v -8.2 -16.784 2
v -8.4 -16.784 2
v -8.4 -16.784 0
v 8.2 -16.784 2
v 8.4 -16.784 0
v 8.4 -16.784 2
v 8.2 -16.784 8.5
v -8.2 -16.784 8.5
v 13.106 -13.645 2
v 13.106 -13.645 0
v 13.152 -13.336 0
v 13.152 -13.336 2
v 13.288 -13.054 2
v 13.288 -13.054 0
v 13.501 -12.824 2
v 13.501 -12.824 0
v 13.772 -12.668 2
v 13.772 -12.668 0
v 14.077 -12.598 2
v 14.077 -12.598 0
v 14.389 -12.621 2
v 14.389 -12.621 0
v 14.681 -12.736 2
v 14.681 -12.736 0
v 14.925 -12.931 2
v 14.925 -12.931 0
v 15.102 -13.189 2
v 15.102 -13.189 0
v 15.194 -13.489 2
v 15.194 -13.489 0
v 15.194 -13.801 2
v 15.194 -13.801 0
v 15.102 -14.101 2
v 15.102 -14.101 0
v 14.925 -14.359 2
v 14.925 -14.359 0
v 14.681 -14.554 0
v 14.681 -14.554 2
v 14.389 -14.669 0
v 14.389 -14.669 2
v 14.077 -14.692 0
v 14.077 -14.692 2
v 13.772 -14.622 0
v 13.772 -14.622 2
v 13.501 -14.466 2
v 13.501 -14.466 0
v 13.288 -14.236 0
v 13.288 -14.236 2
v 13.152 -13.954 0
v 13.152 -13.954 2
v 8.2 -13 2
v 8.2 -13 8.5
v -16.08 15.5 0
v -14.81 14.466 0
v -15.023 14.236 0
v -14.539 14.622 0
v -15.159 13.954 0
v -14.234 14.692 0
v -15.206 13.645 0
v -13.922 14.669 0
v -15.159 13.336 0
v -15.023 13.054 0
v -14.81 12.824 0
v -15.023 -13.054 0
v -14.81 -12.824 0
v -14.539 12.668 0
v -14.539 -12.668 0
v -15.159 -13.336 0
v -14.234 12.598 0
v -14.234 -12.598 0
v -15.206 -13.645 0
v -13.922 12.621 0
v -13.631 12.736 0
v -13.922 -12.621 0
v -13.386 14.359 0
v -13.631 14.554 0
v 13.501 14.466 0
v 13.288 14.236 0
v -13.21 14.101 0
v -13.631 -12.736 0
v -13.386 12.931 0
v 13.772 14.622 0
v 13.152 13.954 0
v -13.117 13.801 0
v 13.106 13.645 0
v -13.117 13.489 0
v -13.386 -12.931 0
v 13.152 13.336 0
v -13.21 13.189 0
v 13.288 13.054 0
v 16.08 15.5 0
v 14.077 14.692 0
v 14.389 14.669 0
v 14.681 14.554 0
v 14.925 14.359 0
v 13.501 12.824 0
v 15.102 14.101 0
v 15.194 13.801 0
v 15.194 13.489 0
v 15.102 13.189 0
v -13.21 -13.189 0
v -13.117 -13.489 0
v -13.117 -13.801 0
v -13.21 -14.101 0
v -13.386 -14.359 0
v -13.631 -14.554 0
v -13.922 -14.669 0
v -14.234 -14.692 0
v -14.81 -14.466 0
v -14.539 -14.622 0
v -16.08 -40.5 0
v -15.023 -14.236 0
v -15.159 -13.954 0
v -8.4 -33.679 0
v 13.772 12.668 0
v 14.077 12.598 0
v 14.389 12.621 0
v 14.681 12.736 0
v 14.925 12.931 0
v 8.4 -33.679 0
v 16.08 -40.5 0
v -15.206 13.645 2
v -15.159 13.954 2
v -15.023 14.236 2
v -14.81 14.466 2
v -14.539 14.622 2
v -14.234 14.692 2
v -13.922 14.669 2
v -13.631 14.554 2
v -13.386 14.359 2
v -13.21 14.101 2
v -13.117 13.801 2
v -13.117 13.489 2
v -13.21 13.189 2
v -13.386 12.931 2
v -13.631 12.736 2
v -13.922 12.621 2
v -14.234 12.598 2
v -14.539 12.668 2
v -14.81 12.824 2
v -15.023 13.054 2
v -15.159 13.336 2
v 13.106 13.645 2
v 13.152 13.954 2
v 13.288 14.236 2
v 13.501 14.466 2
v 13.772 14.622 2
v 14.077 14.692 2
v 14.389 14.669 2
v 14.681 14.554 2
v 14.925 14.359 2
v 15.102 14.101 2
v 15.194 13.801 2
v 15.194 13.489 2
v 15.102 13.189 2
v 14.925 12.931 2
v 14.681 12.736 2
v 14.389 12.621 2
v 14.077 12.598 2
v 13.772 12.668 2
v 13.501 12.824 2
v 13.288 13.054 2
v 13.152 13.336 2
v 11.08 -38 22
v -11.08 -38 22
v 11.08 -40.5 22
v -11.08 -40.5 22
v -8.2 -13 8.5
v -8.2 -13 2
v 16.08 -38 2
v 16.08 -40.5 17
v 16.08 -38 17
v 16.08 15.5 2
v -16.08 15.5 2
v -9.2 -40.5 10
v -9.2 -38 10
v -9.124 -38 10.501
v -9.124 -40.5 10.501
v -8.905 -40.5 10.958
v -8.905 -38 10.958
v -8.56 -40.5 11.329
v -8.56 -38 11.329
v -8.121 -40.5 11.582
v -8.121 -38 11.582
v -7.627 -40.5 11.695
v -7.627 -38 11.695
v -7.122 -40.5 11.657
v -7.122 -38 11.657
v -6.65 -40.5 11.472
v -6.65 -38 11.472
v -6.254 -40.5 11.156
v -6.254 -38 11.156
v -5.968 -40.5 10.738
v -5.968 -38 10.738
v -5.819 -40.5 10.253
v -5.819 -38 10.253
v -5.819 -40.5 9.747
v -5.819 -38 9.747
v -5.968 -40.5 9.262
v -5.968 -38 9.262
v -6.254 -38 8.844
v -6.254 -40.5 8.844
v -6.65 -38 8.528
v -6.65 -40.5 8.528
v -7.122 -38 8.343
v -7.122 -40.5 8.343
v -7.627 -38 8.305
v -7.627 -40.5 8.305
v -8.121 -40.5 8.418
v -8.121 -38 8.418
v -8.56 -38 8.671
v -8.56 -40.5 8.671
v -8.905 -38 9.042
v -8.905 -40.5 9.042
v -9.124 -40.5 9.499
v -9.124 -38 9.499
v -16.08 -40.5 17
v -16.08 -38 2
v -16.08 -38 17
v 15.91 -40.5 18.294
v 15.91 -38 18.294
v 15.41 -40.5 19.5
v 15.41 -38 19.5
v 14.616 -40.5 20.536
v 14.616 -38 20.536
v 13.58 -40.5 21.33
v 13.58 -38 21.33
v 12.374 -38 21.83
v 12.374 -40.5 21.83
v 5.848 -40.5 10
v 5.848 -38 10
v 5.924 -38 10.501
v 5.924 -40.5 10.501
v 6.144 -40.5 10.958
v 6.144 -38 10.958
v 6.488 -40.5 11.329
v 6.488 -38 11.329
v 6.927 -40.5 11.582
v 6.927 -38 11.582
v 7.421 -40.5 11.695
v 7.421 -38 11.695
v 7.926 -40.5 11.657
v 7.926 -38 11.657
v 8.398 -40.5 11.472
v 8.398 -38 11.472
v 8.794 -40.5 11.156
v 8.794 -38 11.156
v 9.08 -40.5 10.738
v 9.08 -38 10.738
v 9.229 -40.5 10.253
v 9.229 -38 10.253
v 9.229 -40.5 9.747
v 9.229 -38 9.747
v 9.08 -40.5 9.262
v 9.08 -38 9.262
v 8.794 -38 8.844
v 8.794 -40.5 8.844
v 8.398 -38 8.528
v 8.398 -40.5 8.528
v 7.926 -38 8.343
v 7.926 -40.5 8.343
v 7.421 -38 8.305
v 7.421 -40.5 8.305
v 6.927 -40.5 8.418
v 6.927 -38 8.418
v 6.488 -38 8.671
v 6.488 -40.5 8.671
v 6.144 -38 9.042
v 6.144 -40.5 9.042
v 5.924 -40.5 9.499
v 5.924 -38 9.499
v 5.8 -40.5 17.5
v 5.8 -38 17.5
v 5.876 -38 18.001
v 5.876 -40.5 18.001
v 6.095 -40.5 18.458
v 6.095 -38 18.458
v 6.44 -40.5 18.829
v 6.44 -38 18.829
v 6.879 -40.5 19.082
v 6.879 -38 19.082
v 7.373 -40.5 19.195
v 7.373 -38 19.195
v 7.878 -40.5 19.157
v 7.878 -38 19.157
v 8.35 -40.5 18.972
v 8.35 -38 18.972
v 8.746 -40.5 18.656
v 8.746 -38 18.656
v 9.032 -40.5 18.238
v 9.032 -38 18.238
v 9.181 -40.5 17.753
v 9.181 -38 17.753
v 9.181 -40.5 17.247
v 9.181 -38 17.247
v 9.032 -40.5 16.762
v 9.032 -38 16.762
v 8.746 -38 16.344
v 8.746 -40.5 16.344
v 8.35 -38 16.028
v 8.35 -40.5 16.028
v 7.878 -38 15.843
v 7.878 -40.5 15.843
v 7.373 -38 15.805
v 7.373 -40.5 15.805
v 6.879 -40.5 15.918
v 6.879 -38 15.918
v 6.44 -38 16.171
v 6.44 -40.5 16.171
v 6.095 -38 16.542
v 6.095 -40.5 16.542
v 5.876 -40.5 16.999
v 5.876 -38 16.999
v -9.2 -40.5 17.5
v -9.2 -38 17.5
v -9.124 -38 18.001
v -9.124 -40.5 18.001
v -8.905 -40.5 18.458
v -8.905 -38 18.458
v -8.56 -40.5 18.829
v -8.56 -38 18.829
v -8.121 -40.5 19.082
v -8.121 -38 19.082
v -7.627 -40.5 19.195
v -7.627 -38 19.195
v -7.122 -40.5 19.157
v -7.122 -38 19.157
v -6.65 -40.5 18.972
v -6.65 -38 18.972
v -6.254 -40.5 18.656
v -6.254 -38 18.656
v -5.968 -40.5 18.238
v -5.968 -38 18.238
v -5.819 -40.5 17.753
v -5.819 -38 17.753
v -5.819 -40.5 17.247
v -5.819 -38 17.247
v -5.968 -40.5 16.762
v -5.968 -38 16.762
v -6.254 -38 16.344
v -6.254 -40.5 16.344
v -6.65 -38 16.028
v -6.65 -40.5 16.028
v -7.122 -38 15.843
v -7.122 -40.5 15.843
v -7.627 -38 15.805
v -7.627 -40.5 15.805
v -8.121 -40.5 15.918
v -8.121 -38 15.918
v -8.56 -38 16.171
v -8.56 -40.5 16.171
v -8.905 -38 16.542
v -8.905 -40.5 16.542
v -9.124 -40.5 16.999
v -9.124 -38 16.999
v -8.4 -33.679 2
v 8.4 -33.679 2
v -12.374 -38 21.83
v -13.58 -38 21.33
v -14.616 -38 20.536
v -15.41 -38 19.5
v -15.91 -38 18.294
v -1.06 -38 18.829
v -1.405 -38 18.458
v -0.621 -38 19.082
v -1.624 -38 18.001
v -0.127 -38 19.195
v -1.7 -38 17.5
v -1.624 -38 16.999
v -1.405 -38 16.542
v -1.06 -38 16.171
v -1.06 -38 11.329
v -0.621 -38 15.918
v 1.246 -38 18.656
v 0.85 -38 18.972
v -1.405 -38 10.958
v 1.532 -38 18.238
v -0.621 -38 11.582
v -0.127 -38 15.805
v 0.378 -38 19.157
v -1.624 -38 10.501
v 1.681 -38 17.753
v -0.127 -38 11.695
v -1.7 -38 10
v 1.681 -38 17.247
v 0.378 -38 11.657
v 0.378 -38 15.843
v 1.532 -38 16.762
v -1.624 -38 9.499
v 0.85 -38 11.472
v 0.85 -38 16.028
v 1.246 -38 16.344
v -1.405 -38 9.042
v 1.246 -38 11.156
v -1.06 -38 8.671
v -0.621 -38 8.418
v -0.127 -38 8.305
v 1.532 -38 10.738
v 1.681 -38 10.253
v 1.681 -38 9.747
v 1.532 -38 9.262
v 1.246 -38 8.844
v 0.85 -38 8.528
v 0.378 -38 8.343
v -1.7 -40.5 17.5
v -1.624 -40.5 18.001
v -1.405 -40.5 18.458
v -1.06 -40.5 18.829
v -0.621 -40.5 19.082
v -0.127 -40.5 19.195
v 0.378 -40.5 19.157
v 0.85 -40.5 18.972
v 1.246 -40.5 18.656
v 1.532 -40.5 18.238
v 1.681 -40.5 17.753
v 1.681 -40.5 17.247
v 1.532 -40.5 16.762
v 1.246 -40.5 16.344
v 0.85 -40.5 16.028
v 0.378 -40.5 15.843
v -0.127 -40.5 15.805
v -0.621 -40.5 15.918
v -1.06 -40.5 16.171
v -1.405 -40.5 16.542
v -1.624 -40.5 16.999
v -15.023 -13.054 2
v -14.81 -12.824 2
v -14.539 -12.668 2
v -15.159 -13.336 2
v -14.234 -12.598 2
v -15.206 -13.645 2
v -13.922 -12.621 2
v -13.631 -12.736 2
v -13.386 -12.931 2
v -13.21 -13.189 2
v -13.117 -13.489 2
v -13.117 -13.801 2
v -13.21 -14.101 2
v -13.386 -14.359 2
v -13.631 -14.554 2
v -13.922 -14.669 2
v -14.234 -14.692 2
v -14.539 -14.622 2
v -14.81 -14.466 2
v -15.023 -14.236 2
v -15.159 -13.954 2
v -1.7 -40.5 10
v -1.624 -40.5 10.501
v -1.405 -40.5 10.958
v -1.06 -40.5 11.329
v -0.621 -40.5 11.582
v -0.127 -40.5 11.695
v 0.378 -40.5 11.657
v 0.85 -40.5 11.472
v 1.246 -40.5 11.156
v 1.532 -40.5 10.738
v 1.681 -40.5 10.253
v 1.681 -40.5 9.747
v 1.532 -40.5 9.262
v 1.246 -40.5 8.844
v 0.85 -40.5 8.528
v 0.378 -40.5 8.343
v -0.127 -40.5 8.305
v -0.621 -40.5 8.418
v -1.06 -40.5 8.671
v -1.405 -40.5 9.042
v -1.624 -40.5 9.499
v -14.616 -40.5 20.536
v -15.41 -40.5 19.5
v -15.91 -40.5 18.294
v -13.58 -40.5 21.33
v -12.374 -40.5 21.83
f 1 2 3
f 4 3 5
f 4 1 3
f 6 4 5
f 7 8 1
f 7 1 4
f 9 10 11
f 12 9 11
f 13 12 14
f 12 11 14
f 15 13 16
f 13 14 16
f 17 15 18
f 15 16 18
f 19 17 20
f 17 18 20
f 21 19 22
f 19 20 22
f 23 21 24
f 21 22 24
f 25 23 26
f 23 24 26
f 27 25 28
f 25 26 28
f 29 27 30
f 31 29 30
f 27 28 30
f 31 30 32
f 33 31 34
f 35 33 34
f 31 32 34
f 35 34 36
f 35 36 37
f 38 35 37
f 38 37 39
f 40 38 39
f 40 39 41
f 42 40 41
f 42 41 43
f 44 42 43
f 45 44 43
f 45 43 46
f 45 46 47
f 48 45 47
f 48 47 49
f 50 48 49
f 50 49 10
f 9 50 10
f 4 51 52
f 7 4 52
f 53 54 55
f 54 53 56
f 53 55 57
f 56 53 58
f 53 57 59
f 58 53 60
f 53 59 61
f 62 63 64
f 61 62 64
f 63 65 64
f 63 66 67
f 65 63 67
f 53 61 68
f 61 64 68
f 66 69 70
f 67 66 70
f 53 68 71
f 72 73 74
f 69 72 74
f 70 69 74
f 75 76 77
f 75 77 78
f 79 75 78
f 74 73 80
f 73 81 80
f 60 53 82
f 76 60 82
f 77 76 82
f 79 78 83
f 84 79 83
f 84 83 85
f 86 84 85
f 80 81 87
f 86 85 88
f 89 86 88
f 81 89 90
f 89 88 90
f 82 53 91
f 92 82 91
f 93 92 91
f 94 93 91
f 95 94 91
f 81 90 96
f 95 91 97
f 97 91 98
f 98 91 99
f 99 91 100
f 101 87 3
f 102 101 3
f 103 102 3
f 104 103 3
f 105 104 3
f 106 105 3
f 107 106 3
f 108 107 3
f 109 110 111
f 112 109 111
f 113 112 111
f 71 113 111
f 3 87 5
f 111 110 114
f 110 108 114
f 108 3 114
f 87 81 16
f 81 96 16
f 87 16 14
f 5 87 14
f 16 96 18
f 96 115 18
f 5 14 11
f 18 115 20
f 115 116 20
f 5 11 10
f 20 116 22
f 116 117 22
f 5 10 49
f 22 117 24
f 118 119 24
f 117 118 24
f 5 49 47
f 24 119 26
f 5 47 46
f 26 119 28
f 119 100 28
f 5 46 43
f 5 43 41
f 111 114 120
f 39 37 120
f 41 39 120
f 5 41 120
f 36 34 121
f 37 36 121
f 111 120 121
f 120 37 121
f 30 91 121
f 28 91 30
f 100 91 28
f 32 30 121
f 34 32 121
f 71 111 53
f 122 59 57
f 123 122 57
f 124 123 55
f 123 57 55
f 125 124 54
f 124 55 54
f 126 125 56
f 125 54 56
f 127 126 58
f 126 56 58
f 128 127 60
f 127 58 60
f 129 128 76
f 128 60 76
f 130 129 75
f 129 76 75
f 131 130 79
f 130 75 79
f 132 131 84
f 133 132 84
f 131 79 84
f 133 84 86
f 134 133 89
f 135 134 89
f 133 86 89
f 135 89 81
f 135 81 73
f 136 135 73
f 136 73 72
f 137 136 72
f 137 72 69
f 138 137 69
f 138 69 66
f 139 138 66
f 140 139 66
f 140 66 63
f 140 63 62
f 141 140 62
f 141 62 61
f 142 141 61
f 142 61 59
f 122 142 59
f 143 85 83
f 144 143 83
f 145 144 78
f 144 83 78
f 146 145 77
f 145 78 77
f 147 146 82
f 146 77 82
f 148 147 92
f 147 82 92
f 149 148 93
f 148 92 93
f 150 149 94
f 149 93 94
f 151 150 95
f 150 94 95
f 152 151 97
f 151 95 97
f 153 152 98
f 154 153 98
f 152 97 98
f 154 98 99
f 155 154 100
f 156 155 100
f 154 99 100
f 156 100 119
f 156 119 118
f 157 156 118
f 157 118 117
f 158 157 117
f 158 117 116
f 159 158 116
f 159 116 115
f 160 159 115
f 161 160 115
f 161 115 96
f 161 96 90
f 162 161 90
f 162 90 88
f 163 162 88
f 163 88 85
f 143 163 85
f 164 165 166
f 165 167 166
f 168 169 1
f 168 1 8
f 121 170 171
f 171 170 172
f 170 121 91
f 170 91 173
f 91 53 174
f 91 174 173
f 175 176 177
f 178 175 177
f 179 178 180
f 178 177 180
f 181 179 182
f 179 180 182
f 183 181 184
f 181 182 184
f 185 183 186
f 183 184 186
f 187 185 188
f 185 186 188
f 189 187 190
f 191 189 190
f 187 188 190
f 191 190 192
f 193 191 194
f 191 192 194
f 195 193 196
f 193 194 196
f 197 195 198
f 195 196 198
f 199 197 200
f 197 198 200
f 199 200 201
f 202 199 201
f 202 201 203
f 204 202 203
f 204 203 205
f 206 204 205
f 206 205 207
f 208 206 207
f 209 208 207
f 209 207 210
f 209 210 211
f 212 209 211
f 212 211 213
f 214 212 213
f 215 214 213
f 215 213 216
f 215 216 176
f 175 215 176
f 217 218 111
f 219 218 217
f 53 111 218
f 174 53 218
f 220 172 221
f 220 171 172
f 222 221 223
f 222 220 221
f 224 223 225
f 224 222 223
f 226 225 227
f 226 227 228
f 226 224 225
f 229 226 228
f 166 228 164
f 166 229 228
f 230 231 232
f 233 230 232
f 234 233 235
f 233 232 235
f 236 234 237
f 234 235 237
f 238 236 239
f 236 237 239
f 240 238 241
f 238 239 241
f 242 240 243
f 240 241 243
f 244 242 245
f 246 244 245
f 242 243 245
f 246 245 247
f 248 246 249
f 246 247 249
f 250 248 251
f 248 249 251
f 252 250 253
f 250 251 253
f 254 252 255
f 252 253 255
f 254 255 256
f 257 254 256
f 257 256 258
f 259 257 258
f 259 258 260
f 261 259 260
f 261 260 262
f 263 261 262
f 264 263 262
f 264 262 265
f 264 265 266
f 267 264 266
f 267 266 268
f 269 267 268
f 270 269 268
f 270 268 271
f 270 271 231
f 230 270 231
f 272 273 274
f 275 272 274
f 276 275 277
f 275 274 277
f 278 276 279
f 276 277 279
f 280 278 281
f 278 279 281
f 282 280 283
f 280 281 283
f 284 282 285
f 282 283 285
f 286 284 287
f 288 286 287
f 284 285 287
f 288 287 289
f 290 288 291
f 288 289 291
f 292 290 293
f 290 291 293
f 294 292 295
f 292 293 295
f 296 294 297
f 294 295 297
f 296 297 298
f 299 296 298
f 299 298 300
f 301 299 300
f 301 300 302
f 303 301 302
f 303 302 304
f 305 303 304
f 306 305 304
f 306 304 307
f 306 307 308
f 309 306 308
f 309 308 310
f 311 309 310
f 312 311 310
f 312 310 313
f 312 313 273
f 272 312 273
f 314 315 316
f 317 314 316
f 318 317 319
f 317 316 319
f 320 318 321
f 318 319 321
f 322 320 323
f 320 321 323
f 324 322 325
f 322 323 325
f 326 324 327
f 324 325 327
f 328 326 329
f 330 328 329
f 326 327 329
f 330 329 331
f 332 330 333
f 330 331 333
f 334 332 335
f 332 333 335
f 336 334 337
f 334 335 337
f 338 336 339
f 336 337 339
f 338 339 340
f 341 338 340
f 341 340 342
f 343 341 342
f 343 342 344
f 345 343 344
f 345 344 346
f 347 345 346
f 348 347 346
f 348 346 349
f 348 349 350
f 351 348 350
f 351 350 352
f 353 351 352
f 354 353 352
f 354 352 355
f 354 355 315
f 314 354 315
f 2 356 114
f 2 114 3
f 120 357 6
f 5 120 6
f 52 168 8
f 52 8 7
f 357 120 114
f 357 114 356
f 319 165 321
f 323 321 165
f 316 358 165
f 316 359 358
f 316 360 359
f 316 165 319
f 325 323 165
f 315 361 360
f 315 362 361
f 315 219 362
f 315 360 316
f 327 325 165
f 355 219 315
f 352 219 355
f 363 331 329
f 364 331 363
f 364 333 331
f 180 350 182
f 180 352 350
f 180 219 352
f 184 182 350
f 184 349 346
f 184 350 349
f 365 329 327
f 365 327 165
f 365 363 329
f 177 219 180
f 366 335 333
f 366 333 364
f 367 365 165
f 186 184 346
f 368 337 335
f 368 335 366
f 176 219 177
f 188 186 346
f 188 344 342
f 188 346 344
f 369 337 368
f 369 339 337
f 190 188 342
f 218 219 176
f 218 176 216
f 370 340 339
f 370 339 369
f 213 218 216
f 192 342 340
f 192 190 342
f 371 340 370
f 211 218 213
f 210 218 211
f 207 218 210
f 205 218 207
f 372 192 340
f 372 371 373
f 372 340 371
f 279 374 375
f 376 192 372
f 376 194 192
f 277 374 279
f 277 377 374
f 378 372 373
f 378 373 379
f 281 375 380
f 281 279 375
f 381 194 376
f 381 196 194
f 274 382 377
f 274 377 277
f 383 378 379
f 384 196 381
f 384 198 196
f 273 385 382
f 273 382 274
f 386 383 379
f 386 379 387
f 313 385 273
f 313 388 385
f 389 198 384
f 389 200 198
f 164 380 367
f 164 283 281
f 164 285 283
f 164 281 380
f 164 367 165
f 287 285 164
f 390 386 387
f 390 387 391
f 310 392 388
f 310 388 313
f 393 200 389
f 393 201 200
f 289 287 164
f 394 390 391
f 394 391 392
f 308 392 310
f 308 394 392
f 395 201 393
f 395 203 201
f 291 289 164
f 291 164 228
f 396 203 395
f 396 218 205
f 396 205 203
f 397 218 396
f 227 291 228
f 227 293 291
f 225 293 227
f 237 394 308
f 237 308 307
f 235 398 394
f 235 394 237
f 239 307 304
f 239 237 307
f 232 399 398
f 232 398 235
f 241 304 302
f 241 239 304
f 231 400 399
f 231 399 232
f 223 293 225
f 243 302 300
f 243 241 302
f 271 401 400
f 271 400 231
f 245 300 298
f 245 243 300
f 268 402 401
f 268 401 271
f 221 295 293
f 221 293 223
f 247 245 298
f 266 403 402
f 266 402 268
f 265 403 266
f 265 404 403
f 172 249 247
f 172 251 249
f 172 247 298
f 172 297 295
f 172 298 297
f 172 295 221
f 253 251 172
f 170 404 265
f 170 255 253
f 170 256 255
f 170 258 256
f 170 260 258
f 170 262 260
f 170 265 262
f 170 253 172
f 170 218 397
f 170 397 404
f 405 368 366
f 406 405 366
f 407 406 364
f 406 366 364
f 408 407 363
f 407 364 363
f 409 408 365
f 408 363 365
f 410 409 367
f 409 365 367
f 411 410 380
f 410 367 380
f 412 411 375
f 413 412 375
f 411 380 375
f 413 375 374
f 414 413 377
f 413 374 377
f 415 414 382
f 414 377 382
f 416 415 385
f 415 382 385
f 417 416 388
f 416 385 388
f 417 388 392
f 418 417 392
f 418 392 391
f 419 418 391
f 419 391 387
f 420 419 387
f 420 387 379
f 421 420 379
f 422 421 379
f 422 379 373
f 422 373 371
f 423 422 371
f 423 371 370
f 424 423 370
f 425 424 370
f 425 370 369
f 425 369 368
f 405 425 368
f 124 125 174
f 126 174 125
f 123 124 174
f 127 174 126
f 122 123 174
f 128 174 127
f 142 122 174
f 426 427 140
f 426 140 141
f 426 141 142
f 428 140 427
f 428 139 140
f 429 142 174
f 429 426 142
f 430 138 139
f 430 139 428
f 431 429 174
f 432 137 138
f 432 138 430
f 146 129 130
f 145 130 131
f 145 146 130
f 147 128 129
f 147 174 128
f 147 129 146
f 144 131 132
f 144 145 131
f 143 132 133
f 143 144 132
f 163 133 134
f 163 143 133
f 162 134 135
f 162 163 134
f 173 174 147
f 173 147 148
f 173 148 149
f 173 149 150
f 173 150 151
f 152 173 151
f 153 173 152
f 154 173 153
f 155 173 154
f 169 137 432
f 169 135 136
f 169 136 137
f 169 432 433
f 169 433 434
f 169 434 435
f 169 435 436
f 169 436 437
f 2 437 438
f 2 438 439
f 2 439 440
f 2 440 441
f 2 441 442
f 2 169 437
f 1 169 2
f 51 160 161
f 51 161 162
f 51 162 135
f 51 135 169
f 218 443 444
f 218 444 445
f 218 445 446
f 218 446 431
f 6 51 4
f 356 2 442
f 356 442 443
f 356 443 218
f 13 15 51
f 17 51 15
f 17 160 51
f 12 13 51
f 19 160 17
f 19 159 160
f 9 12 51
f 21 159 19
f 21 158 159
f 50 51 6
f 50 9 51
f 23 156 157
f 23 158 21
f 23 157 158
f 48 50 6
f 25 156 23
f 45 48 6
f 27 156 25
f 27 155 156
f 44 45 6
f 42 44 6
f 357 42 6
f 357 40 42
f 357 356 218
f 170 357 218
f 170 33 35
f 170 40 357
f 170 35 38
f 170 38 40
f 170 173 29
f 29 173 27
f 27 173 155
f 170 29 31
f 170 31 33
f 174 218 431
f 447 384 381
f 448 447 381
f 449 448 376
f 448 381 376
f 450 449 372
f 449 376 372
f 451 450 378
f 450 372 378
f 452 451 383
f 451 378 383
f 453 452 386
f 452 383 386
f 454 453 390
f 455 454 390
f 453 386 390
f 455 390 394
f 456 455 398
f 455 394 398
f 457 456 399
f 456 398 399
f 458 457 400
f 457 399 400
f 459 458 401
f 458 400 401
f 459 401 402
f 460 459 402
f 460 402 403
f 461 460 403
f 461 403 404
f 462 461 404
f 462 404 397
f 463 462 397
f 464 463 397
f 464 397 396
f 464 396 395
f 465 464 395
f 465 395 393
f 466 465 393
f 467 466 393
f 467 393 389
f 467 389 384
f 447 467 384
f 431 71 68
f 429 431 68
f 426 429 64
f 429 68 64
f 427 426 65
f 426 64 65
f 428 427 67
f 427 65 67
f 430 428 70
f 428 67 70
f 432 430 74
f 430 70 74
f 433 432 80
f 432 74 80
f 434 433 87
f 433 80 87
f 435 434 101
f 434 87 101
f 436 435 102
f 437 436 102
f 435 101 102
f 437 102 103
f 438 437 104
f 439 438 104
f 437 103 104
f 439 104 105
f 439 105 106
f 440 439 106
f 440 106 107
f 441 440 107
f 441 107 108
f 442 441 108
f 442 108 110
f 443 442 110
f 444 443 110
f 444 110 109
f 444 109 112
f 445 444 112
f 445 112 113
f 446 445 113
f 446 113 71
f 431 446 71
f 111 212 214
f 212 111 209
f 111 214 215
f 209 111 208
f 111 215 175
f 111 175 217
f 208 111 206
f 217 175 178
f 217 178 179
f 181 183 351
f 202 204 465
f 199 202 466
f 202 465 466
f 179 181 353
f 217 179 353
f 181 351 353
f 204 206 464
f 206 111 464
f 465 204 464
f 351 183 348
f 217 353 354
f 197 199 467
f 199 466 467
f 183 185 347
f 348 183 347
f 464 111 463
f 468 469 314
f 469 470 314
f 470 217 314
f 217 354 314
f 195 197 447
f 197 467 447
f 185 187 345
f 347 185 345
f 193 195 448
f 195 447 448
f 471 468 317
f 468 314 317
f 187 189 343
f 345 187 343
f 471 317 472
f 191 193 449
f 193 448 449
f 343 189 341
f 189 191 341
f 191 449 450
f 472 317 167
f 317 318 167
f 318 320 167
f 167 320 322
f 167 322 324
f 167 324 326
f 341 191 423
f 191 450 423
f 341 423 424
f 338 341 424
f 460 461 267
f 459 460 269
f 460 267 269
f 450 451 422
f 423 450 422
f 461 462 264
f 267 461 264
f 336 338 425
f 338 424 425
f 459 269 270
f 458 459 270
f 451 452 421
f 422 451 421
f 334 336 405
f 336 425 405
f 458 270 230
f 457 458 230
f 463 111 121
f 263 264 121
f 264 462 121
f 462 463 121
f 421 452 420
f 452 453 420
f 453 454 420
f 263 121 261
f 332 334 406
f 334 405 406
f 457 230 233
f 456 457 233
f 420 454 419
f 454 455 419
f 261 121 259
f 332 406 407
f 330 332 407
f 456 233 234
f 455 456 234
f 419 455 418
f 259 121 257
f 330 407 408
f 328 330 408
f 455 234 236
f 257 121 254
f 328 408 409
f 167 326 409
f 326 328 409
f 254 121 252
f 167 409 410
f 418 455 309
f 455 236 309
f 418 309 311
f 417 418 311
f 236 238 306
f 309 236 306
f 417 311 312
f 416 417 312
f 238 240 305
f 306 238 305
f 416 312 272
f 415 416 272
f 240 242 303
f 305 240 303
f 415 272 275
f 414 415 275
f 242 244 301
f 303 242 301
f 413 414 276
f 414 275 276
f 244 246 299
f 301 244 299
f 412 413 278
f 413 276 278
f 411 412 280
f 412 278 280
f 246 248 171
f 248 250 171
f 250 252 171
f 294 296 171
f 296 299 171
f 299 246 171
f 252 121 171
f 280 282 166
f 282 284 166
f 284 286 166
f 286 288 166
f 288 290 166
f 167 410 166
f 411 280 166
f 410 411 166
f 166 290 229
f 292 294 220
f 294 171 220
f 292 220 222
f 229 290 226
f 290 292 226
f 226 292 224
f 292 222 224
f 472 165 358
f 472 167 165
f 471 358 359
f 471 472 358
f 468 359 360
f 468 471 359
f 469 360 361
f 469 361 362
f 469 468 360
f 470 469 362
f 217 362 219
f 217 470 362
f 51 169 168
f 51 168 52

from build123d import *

# Parameters (mm, degrees)
F0_W      = 32.16
F0_H      = 31
F1_DEPTH  = 2
F3_D      = 2.1
F3_DEPTH  = 5
F3_TIP    = 0.63090365
F4_W      = 16.8
F4_H      = 2.5
F5_DEPTH  = 6.5
F6_DEPTH  = 25
F7_W      = 16.8
F7_H      = 23.7160715014
F8_DEPTH  = 25
F9_W      = 6.8209058344
F9_H      = 2
F10_DEPTH = 18
F11_W     = 32.16
F11_H     = 2.5
F12_DEPTH = 22
F14_D     = 3.4
F14_DEPTH = 5
F14_TIP   = 1.0214630523
F15_DEPTH = 0.2
F16_DEPTH = 0.2
F17_R     = 5


with BuildPart() as f1:
    # F0 (on Top) → F1 (new body)
    with BuildSketch(Plane.XY):
        Rectangle(F0_W, F0_H)
    extrude(amount=F1_DEPTH)

    # F3
    with Locations(Plane.XY.offset(2)):
        with Locations((-14.1555870968, 13.645), (14.1555870968, 13.645), (-14.1555870968, -13.645), (14.1555870968, -13.645)):
            Hole(F3_D / 2, depth=F3_DEPTH)
            with Locations((0, 0, -(F3_DEPTH + F3_TIP / 2))):  # 118° drill point
                Cone(0, F3_D / 2, F3_TIP, mode=Mode.SUBTRACT)

    # F4 (on face) → F5 (join)
    with BuildSketch(Plane.XY.offset(2)):
        with Locations((0, -14.25)):
            Rectangle(F4_W, F4_H)
    extrude(amount=F5_DEPTH)

    # F6 (add): a face of the model
    f6_faces = [f1.faces().sort_by_distance(p)[0] for p in [
        (0, -15.5, 3.6746196404),
    ]]
    extrude(f6_faces, amount=F6_DEPTH)

    # F7 (on face) → F8 (cut)
    with BuildSketch(Plane.XY.offset(8.5)):
        with Locations((0, -28.6419642493)):
            Rectangle(F7_W, F7_H)
    extrude(amount=-F8_DEPTH, mode=Mode.SUBTRACT)

    # F9 (on face) → F10 (join)
    with BuildSketch(Plane(origin=(8.4, 0, 0), x_dir=(0, -1, 0), z_dir=(-1, 0, 0))):
        with Locations((37.0895470828, 1)):
            Rectangle(F9_W, F9_H)
    extrude(amount=F10_DEPTH)

    # F11 (on face) → F12 (join)
    with BuildSketch(Plane(origin=(0, 0, 0), x_dir=(1, 0, 0), z_dir=(0, 0, -1))):
        with Locations((0, 39.25)):
            Rectangle(F11_W, F11_H)
    extrude(amount=-F12_DEPTH)

    # F14
    with Locations(Plane.XZ.offset(40.5)):
        with Locations((-7.5, 17.5), (-7.5, 10), (0, 10), (0, 17.5), (7.5, 17.5), (7.5482047356, 10)):
            Hole(F14_D / 2, depth=F14_DEPTH)
            with Locations((0, 0, -(F14_DEPTH + F14_TIP / 2))):  # 118° drill point
                Cone(0, F14_D / 2, F14_TIP, mode=Mode.SUBTRACT)

    # F15 (cut): a face of the model
    f15_faces = [f1.faces().sort_by_distance(p)[0] for p in [
        (8.4, -14.8919642493, 5.25),
    ]]
    extrude(f15_faces, amount=-F15_DEPTH, mode=Mode.SUBTRACT)

    # F16 (cut): a face of the model
    f16_faces = [f1.faces().sort_by_distance(p)[0] for p in [
        (-8.4, -14.8919642493, 5.25),
    ]]
    extrude(f16_faces, amount=-F16_DEPTH, mode=Mode.SUBTRACT)

    # F17
    f17_edges = [f1.edges().sort_by_distance(p)[0] for p in [
        (-16.08, -39.25, 22),
        (16.08, -39.25, 22),
    ]]
    fillet(f17_edges, radius=F17_R)


solid = f1.part
